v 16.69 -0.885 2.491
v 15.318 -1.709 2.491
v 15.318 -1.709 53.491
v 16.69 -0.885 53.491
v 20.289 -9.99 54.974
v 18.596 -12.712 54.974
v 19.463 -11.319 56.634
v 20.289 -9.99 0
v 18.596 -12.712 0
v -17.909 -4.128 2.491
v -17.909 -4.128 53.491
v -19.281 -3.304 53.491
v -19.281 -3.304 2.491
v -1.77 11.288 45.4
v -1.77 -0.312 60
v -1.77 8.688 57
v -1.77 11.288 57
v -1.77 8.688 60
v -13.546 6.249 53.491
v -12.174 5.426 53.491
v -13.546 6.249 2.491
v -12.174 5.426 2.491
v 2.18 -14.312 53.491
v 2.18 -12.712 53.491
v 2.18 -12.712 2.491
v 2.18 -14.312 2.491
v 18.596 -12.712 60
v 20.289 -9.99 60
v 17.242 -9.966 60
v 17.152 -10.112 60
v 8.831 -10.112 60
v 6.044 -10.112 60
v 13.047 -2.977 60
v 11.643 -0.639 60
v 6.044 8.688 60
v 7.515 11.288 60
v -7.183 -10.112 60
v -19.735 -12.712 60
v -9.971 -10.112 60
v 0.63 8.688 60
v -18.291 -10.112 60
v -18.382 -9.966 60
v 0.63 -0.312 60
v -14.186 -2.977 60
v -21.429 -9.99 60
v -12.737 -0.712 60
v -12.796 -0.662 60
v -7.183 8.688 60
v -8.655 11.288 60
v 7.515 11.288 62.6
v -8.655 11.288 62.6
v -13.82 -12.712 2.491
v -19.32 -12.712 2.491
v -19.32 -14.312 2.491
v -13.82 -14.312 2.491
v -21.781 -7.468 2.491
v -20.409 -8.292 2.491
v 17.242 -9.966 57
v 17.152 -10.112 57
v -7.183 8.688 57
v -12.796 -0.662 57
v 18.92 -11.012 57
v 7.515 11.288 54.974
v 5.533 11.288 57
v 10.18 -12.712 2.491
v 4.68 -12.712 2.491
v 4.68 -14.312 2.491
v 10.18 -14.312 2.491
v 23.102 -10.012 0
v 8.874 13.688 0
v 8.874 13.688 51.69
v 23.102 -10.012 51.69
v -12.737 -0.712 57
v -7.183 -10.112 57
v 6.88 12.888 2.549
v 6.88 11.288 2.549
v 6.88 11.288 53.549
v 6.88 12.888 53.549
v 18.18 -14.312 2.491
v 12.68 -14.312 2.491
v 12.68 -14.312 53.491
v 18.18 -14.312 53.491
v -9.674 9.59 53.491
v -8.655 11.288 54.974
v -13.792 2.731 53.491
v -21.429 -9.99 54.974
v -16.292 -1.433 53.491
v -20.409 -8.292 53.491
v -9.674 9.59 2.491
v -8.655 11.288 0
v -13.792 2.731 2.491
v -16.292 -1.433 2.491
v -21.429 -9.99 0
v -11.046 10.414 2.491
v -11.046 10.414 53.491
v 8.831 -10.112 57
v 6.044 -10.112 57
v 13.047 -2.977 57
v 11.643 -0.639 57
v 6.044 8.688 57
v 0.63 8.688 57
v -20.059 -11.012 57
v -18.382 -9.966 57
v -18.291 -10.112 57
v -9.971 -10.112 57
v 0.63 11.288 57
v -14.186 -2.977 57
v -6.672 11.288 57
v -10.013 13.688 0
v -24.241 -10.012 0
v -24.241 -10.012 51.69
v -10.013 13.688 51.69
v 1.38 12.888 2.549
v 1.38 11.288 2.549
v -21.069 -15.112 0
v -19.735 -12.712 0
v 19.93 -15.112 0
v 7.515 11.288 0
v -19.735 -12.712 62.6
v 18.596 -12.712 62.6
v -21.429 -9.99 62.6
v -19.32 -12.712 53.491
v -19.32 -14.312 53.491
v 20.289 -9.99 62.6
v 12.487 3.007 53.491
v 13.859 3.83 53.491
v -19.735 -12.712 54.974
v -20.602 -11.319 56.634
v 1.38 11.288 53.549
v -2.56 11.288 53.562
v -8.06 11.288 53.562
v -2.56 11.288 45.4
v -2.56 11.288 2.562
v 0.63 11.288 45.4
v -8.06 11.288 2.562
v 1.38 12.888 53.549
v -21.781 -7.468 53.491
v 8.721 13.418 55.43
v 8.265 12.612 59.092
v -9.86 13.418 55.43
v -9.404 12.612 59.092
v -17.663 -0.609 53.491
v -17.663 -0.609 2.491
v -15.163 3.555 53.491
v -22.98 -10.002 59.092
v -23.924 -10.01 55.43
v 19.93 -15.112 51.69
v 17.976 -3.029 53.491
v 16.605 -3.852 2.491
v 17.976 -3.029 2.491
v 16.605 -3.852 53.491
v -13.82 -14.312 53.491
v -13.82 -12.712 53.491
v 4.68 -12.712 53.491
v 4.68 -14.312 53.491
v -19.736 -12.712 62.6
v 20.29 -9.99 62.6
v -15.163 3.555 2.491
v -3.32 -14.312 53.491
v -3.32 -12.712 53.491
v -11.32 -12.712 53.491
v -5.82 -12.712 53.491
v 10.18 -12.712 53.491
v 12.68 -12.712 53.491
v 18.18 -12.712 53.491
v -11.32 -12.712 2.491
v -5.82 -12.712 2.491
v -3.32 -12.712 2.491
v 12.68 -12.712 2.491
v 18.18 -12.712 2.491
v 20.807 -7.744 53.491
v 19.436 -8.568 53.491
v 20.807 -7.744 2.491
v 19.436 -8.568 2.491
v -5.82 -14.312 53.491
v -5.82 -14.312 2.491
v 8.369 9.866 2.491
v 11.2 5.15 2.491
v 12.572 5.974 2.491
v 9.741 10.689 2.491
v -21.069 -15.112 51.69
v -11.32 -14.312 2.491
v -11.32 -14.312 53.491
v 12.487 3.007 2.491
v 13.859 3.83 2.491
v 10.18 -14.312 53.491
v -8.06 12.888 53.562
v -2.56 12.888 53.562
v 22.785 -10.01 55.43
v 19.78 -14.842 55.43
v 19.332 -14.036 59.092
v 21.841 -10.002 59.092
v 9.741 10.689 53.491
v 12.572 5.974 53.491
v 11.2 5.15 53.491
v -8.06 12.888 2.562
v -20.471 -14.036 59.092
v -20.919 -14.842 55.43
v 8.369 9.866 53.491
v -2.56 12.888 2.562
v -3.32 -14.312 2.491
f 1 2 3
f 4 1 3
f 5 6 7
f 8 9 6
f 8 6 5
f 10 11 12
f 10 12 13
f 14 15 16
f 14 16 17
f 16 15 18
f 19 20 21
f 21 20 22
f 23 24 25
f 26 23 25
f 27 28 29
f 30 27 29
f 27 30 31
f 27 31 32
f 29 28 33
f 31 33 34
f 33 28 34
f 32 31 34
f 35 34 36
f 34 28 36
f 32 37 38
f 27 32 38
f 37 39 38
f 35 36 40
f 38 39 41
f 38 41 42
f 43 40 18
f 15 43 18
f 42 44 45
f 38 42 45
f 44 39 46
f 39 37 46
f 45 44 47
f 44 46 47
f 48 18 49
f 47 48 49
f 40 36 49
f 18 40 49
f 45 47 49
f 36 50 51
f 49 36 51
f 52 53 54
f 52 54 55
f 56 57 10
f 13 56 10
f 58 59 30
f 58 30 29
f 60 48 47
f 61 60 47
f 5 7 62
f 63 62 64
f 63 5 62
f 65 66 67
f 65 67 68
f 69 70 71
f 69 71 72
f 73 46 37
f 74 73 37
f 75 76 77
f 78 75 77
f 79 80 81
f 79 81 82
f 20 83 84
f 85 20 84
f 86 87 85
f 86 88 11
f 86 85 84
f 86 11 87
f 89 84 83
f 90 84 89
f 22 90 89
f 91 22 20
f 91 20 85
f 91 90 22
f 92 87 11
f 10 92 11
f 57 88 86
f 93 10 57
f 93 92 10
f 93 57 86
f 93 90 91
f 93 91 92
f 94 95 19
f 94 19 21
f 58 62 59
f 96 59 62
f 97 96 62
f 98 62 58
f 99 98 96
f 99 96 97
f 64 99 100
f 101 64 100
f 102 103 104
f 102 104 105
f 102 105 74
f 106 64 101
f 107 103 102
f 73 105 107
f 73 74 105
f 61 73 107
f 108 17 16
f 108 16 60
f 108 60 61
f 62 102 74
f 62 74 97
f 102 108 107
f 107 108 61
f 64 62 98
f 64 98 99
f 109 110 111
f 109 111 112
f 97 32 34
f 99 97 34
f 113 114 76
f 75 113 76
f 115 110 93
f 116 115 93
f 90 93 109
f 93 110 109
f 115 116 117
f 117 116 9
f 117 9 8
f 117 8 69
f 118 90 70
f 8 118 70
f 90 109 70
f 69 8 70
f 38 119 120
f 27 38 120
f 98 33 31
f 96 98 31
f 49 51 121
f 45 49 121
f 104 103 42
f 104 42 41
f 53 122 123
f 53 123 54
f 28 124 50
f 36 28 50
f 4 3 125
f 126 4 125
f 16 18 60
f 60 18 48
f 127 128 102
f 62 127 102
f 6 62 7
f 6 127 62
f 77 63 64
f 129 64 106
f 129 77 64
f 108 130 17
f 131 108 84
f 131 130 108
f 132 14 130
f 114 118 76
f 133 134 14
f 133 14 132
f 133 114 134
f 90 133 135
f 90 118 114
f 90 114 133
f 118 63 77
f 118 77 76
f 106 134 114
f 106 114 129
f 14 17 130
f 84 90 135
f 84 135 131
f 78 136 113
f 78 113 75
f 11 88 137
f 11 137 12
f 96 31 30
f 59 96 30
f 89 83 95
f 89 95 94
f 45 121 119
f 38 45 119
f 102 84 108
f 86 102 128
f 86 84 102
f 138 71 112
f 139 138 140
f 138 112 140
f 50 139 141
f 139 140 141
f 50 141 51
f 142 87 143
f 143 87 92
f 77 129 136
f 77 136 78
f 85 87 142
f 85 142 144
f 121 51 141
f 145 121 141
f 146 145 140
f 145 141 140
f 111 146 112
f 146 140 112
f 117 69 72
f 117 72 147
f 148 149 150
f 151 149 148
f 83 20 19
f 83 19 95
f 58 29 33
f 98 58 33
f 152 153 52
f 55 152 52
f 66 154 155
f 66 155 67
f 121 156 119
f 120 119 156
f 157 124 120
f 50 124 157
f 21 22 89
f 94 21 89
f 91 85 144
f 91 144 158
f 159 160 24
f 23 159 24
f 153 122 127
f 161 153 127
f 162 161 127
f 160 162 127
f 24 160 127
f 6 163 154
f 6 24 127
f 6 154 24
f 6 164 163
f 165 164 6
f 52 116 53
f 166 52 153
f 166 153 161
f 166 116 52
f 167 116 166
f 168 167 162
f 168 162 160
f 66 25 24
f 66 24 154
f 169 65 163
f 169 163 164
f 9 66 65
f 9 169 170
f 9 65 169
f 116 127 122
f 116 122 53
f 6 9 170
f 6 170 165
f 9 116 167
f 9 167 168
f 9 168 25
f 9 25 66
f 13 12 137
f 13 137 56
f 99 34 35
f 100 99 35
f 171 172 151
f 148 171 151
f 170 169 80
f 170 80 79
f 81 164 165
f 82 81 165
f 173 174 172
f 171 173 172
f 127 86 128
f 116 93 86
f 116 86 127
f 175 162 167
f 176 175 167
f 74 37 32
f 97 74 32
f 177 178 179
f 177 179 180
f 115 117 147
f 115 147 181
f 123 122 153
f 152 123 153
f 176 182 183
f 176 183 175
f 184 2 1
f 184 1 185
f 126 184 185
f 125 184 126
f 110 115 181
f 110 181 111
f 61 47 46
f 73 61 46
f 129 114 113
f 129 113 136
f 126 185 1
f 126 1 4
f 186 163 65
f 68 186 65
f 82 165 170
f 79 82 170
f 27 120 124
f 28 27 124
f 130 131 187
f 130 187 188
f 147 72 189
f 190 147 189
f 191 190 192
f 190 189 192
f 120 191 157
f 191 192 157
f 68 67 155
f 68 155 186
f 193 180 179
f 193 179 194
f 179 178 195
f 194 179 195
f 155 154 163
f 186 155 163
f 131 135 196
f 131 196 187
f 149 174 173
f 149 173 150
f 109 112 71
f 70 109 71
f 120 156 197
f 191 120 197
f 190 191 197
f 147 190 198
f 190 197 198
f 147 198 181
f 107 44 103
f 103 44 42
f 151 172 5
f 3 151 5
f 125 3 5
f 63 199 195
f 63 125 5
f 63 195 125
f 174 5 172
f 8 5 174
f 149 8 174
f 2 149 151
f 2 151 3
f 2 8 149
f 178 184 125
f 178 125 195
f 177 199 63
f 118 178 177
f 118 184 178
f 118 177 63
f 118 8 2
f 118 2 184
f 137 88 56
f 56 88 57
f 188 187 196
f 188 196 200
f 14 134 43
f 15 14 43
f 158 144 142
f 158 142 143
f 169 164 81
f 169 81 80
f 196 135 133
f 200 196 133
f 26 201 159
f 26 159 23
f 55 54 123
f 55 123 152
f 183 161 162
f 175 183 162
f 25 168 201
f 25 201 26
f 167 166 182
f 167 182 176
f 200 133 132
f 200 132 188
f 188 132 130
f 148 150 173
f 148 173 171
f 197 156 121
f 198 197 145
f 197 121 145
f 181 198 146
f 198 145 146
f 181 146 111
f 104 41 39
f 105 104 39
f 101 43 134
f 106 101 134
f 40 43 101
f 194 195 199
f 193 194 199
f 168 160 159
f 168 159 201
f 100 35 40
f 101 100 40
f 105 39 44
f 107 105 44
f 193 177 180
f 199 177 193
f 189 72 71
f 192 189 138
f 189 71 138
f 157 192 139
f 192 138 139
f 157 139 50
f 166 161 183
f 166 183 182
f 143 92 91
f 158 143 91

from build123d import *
from OCP.BRepFilletAPI import BRepFilletAPI_MakeChamfer

# Parameters (mm, degrees)
BOSS_EXTRUDE1_DEPTH  = 62.6
BOSS_EXTRUDE2_DEPTH  = 5.6
CUT_EXTRUDE1_DEPTH   = 2.6
CHAMFER1_SIZE        = 5
CHAMFER1_SIZE_2      = 2.6
SKETCH7_W            = 2.4
SKETCH7_H            = 11.6
BOSS_EXTRUDE3_DEPTH  = 14.6
CUT_EXTRUDE2_DEPTH   = 5.6
BOSS_EXTRUDE11_DEPTH = 3
CUT_EXTRUDE3_DEPTH   = 81
FILLET1_R            = 26
SKETCH11_W           = 5.5
SKETCH11_H           = 51
CUT_EXTRUDE4_DEPTH   = 1.6
LPATTERN1_COUNT      = 3
LPATTERN1_PITCH      = 8
LPATTERN1_COL_COUNT  = 3
LPATTERN1_COL_PITCH  = 8
SKETCH12_W           = 51
SKETCH12_H           = 4.856806487
CUT_EXTRUDE5_DEPTH   = 1.6
LPATTERN2_COUNT      = 2
LPATTERN2_PITCH      = 8
LPATTERN2_COL_COUNT  = 2
LPATTERN2_COL_PITCH  = 8
SKETCH13_W           = 51
SKETCH13_H           = 5.5
CUT_EXTRUDE6_DEPTH   = 1.6
LPATTERN3_COUNT      = 2
LPATTERN3_PITCH      = 8
LPATTERN3_COL_COUNT  = 2
LPATTERN3_COL_PITCH  = 8
SKETCH14_W           = 5.5
SKETCH14_H           = 51
CUT_EXTRUDE7_DEPTH   = 1.6
CHAMFER2_SIZE        = 1.7
CHAMFER2_SIZE2       = 2.025981107
CHAMFER3_SIZE        = 1.7
CHAMFER3_SIZE2       = 2.025981107
CHAMFER4_SIZE        = 1.7
CHAMFER4_SIZE2       = 2.025981107


# Some blends are built 0.0001 mm under size
with BuildPart() as part:
    # Sketch1 → Boss-Extrude1 (new body)
    with BuildSketch(Plane.XY):
        Polygon((-24.475616366, -10.013909772), (-21.180169245, -15.311974759), (20.041009631, -15.311974759), (23.336456752, -10.013909772), (8.987096109, 13.888025241), (-10.126255723, 13.888025241), align=None)
        Polygon((-21.428634645, -9.989877279), (-19.735463964, -12.711974759), (18.59630435, -12.711974759), (20.289475031, -9.989877279), (7.515434067, 11.288025241), (-8.654593681, 11.288025241), align=None, mode=Mode.SUBTRACT)
    extrude(amount=BOSS_EXTRUDE1_DEPTH)

    # Sketch2 → Boss-Extrude2 (add)
    with BuildSketch(Plane.XY.offset(62.6)):
        Polygon((-8.654593681, 11.288025241), (-21.428634645, -9.989877279), (-19.735463964, -12.711974759), (18.59630435, -12.711974759), (20.289475031, -9.989877279), (7.515434067, 11.288025241), align=None)
        Polygon((-7.182931639, 8.688025241), (-18.381652924, -9.965844785), (-18.290758683, -10.111974759), (17.151599069, -10.111974759), (17.24249331, -9.965844785), (6.043772025, 8.688025241), align=None, mode=Mode.SUBTRACT)
    extrude(amount=-BOSS_EXTRUDE2_DEPTH)

    # Sketch4 → Cut-Extrude1 (cut)
    with BuildSketch(Plane.XY.offset(62.6)):
        Polygon((7.515434067, 11.288025241), (-8.654593681, 11.288025241), (-21.428634645, -9.989877279), (-19.735463964, -12.711974759), (18.59630435, -12.711974759), (20.289475031, -9.989877279), align=None)
        Polygon((6.043772025, 8.688025241), (-7.182931639, 8.688025241), (-18.381652924, -9.965844785), (-18.290758683, -10.111974759), (17.151599069, -10.111974759), (17.24249331, -9.965844785), align=None, mode=Mode.SUBTRACT)
    extrude(amount=-CUT_EXTRUDE1_DEPTH, mode=Mode.SUBTRACT)

    # Chamfer1
    chamfer1_edges_1 = [part.edges().sort_by_distance(p)[0] for p in [
        (-0.569579807, -15.311974759, 62.6),
    ]]
    chamfer1_side_1 = [part.faces().sort_by_distance(p)[0] for p in [
        (-0.569579807, -15.311974759, 62.548),
    ]]
    chamfer1_edges_2 = [part.edges().sort_by_distance(p)[0] for p in [
        (21.688733191, -12.662942265, 62.6),
    ]]
    chamfer1_side_2 = [part.faces().sort_by_distance(p)[0] for p in [
        (21.644578037, -12.635477337, 62.6),
    ]]
    chamfer1_edges_3 = [part.edges().sort_by_distance(p)[0] for p in [
        (16.16177643, 1.937057735, 62.6),
    ]]
    chamfer1_side_3 = [part.faces().sort_by_distance(p)[0] for p in [
        (16.117193547, 1.91029271, 62.6),
    ]]
    chamfer1_edges_4 = [part.edges().sort_by_distance(p)[0] for p in [
        (-0.569579807, 13.888025241, 62.6),
    ]]
    chamfer1_side_4 = [part.faces().sort_by_distance(p)[0] for p in [
        (-0.569579807, 13.836025241, 62.6),
    ]]
    chamfer1_edges_5 = [part.edges().sort_by_distance(p)[0] for p in [
        (-17.300936044, 1.937057735, 62.6),
    ]]
    chamfer1_side_5 = [part.faces().sort_by_distance(p)[0] for p in [
        (-17.300936044, 1.937057735, 62.548),
    ]]
    chamfer1_edges_6 = [part.edges().sort_by_distance(p)[0] for p in [
        (-22.827892805, -12.662942265, 62.6),
    ]]
    chamfer1_side_6 = [part.faces().sort_by_distance(p)[0] for p in [
        (-22.827892805, -12.662942265, 62.548),
    ]]
    chamfer1 = BRepFilletAPI_MakeChamfer(part.part.solid().wrapped)
    for e in chamfer1_edges_1:
        chamfer1.Add(CHAMFER1_SIZE - 0.0001, CHAMFER1_SIZE_2 - 0.0001, e.wrapped, chamfer1_side_1[0].wrapped)
    for e in chamfer1_edges_2:
        chamfer1.Add(CHAMFER1_SIZE_2 - 0.0001, CHAMFER1_SIZE - 0.0001, e.wrapped, chamfer1_side_2[0].wrapped)
    for e in chamfer1_edges_3:
        chamfer1.Add(CHAMFER1_SIZE_2 - 0.0001, CHAMFER1_SIZE - 0.0001, e.wrapped, chamfer1_side_3[0].wrapped)
    for e in chamfer1_edges_4:
        chamfer1.Add(CHAMFER1_SIZE_2 - 0.0001, CHAMFER1_SIZE - 0.0001, e.wrapped, chamfer1_side_4[0].wrapped)
    for e in chamfer1_edges_5:
        chamfer1.Add(CHAMFER1_SIZE - 0.0001, CHAMFER1_SIZE_2 - 0.0001, e.wrapped, chamfer1_side_5[0].wrapped)
    for e in chamfer1_edges_6:
        chamfer1.Add(CHAMFER1_SIZE - 0.0001, CHAMFER1_SIZE_2 - 0.0001, e.wrapped, chamfer1_side_6[0].wrapped)
    add(Compound.cast(chamfer1.Shape()), mode=Mode.REPLACE)  # a hair under: the kernel refuses the full size

    # Sketch7 → Boss-Extrude3 (add)
    with BuildSketch(Plane.XY.offset(60)):
        with Locations((-0.569579807, 5.488025241)):
            Rectangle(SKETCH7_W, SKETCH7_H)
    extrude(amount=-BOSS_EXTRUDE3_DEPTH)

    # Sketch8 → Cut-Extrude2 (cut)
    with BuildSketch(Plane(origin=(0.630420193, 0, 0), x_dir=(0, 0, -1), z_dir=(1, 0, 0))):
        Polygon((-45.4, -0.311974759), (-45.4, 11.288025241), (-60, -0.311974759), align=None)
    extrude(amount=-CUT_EXTRUDE2_DEPTH, mode=Mode.SUBTRACT)

    # Sketch9 → Boss-Extrude11 (add)
    with BuildSketch(Plane.XY.offset(60)):
        Polygon((13.046908424, -2.977199103), (8.831384276, -10.111974759), (9.211067566, -10.75458882), (5.807424218, -10.75458882), (6.043772025, -10.111974759), (11.643132668, -0.638909772), (11.902294033, -0.497125706), (13.714637927, -2.3094696), align=None)
        Polygon((-14.186068038, -2.977199103), (-14.822440578, -2.585111628), (-13.347627203, -0.191434724), (-12.736845161, -0.711974759), (-7.182931639, -10.111974759), (-6.628519955, -10.75458882), (-9.97054389, -10.75458882), (-9.97054389, -10.111974759), align=None)
    extrude(amount=-BOSS_EXTRUDE11_DEPTH)

    # Sketch10 → Cut-Extrude3 (cut)
    with BuildSketch(Plane(origin=(0, 0, 0), x_dir=(-1, 0, 0), z_dir=(0, 0, -1))):
        Polygon((24.475616366, -10.013909772), (10.126255723, 13.888025241), (-8.987096109, 13.888025241), (-23.336456752, -10.013909772), (-20.041009631, -15.311974759), (21.180169245, -15.311974759), align=None)
        Polygon((24.241233156, -10.012061119), (10.013050951, 13.688025241), (-8.873891337, 13.688025241), (-23.102073542, -10.012061119), (-19.929878455, -15.111974759), (21.069038069, -15.111974759), align=None, mode=Mode.SUBTRACT)
    extrude(amount=-CUT_EXTRUDE3_DEPTH, mode=Mode.SUBTRACT)

    # Fillet1
    # the kernel refuses this fillet: 26 mm, written as the material it takes off along each edge
    with BuildSketch(Plane(origin=(31.414243832, 3.351351117, 57.984722485), x_dir=(-0.39174625811116504, 0.24366992131316473, 0.8872202875854094), z_dir=(-0.5281717070926119, -0.8491375906335064, 0))) as fillet1_piece_1:
        with BuildLine():
            CenterArc((6.409899399, 25.971924525), FILLET1_R, 242.52600135, 24.811106356)
            Line((-5.585097434, 2.904197048), (-5.824997371, 2.442842498))
            Line((-5.824997371, 2.442842498), (-0.239899937, -0.46135455))
            Line((-0.239899937, -0.46135455), (0, -0.52))
            ThreePointArc((0, -0.52), (2.600976093, -0.52), (5.177793242, -0.51943849))
            Line((5.177793242, -0.51943849), (5.201952186, 0))
        make_face()
    extrude(amount=37.481249755, mode=Mode.SUBTRACT)
    with BuildSketch(Plane(origin=(-36.806666909, -15.111974759, 57.984722485), x_dir=(0, 0.46134603205930286, 0.8872202875854095), z_dir=(1, 0, 0))) as fillet1_piece_2:
        with BuildLine():
            CenterArc((6.409899399, -25.971924525), FILLET1_R, 92.662892294, 24.811106356)
            Line((-5.585097434, -2.904197048), (-5.824997371, -2.442842498))
            Line((-5.824997371, -2.442842498), (-0.239899937, 0.46135455))
            Line((-0.239899937, 0.46135455), (0, 0.52))
            ThreePointArc((0, 0.52), (2.600976093, 0.52), (5.177793242, 0.51943849))
            Line((5.177793242, 0.51943849), (5.201952186, 0))
        make_face()
    extrude(amount=72.474174205, mode=Mode.SUBTRACT)
    with BuildSketch(Plane(origin=(-32.553403446, 3.351351117, 57.984722485), x_dir=(0.39174625811116337, 0.24366992131316362, 0.8872202875854104), z_dir=(0.5281717070926113, -0.8491375906335067, 0))) as fillet1_piece_3:
        with BuildLine():
            CenterArc((6.409899399, -25.971924525), FILLET1_R, 92.662892294, 24.811106356)
            Line((-5.585097434, -2.904197048), (-5.824997371, -2.442842498))
            Line((-5.824997371, -2.442842498), (-0.239899937, 0.46135455))
            Line((-0.239899937, 0.46135455), (0, 0.52))
            ThreePointArc((0, 0.52), (2.600976093, 0.52), (5.177793242, 0.51943849))
            Line((5.177793242, 0.51943849), (5.201952186, 0))
        make_face()
    extrude(amount=37.481249755, mode=Mode.SUBTRACT)
    with BuildSketch(Plane(origin=(-1.912704463, 27.180888106, 57.984722485), x_dir=(0.39554108226314943, -0.2374603409813078, 0.8872202875854099), z_dir=(-0.5147120046125904, -0.8573631391118287, 0))) as fillet1_piece_4:
        with BuildLine():
            CenterArc((6.409899399, -25.971924525), FILLET1_R, 92.662892294, 24.811106356)
            Line((-5.585097434, -2.904197048), (-5.824997371, -2.442842498))
            Line((-5.824997371, -2.442842498), (-0.239899937, 0.46135455))
            Line((-0.239899937, 0.46135455), (0, 0.52))
            ThreePointArc((0, 0.52), (2.600976093, 0.52), (5.177793242, 0.51943849))
            Line((5.177793242, 0.51943849), (5.201952186, 0))
        make_face()
    extrude(amount=59.118254304, mode=Mode.SUBTRACT)
    with BuildSketch(Plane(origin=(-25.750679791, 13.688025241, 57.984722485), x_dir=(0, -0.4613460320593018, 0.88722028758541), z_dir=(1, 0, 0))) as fillet1_piece_5:
        with BuildLine():
            CenterArc((6.409899399, 25.971924525), FILLET1_R, 242.52600135, 24.811106356)
            Line((-5.585097434, 2.904197048), (-5.824997371, 2.442842498))
            Line((-5.824997371, 2.442842498), (-0.239899937, -0.46135455))
            Line((-0.239899937, -0.46135455), (0, -0.52))
            ThreePointArc((0, -0.52), (2.600976093, -0.52), (5.177793242, -0.51943849))
            Line((5.177793242, -0.51943849), (5.201952186, 0))
        make_face()
    extrude(amount=50.362199967, mode=Mode.SUBTRACT)
    with BuildSketch(Plane(origin=(0.773544849, 27.180888106, 57.984722485), x_dir=(-0.3955410822631513, -0.23746034098130891, 0.8872202875854089), z_dir=(0.5147120046125901, -0.8573631391118287, 0))) as fillet1_piece_6:
        with BuildLine():
            CenterArc((6.409899399, 25.971924525), FILLET1_R, 242.52600135, 24.811106356)
            Line((-5.585097434, 2.904197048), (-5.824997371, 2.442842498))
            Line((-5.824997371, 2.442842498), (-0.239899937, -0.46135455))
            Line((-0.239899937, -0.46135455), (0, -0.52))
            ThreePointArc((0, -0.52), (2.600976093, -0.52), (5.177793242, -0.51943849))
            Line((5.177793242, -0.51943849), (5.201952186, 0))
        make_face()
    extrude(amount=59.118254304, mode=Mode.SUBTRACT)

    # Sketch11 → Cut-Extrude4 (cut)
    with BuildSketch(Plane(origin=(0, -12.711974759, 0), x_dir=(1, 0, 0), z_dir=(0, 1, 0))):
        with Locations((-0.569579807, -27.99093939)):
            Rectangle(SKETCH11_W, SKETCH11_H)
    cut_extrude4 = extrude(amount=-CUT_EXTRUDE4_DEPTH, mode=Mode.SUBTRACT)

    # LPattern1: Cut-Extrude4 ×3
    with Locations(*[(i * LPATTERN1_PITCH, 0, 0) for i in range(1, LPATTERN1_COUNT)]):
        add(cut_extrude4, mode=Mode.SUBTRACT)

    # LPattern1 col: Cut-Extrude4 ×3
    with Locations(*[(-i * LPATTERN1_COL_PITCH, 0, 0) for i in range(1, LPATTERN1_COL_COUNT)]):
        add(cut_extrude4, mode=Mode.SUBTRACT)

    # Sketch12 → Cut-Extrude5 (cut)
    with BuildSketch(Plane(origin=(-11.34309584, 6.809748789, 0), x_dir=(0, 0, -1), z_dir=(0.8573631391118286, -0.5147120046125905, 0))):
        with Locations((-27.99093939, -7.185607273)):
            Rectangle(SKETCH12_W, SKETCH12_H)
    cut_extrude5 = extrude(amount=-CUT_EXTRUDE5_DEPTH, mode=Mode.SUBTRACT)

    # LPattern2: Cut-Extrude5 ×2
    with Locations(*[Vector(-0.5147120046125904, -0.8573631391118286, 0) * (i * LPATTERN2_PITCH) for i in range(1, LPATTERN2_COUNT)]):
        add(cut_extrude5, mode=Mode.SUBTRACT)

    # LPattern2 col: Cut-Extrude5 ×2
    with Locations(*[Vector(0.5147120046125906, 0.8573631391118286, 0) * (i * LPATTERN2_COL_PITCH) for i in range(1, LPATTERN2_COL_COUNT)]):
        add(cut_extrude5, mode=Mode.SUBTRACT)

    # Sketch13 → Cut-Extrude6 (cut)
    with BuildSketch(Plane(origin=(10.505732014, 6.307043233, 0), x_dir=(0, 0, 1), z_dir=(-0.8573631391118287, -0.5147120046125901, 0))):
        with Locations((27.99093939, -6.599268144)):
            Rectangle(SKETCH13_W, SKETCH13_H)
    cut_extrude6 = extrude(amount=-CUT_EXTRUDE6_DEPTH, mode=Mode.SUBTRACT)

    # LPattern3: Cut-Extrude6 ×2
    with Locations(*[Vector(0.5147120046125901, -0.8573631391118288, 0) * (i * LPATTERN3_PITCH) for i in range(1, LPATTERN3_COUNT)]):
        add(cut_extrude6, mode=Mode.SUBTRACT)

    # LPattern3 col: Cut-Extrude6 ×2
    with Locations(*[Vector(-0.5147120046125901, 0.8573631391118288, 0) * (i * LPATTERN3_COL_PITCH) for i in range(1, LPATTERN3_COL_COUNT)]):
        add(cut_extrude6, mode=Mode.SUBTRACT)

    # Sketch14 → Cut-Extrude7 (cut)
    with BuildSketch(Plane.XZ.offset(-11.288025241)):
        with Locations((4.130420193, 28.049435943)):
            Rectangle(SKETCH14_W, SKETCH14_H)
        with Locations((-5.310377128, 28.061535376)):
            Rectangle(SKETCH14_W, SKETCH14_H)
    extrude(amount=-CUT_EXTRUDE7_DEPTH, mode=Mode.SUBTRACT)

    # Chamfer2
    chamfer2_edges = [part.edges().sort_by_distance(p)[0] for p in [
        (-0.569579807, -12.711974759, 57),
    ]]
    chamfer2_side = [part.faces().sort_by_distance(p)[0] for p in [
        (-2.250869811, 9.988025241, 57),
    ]]
    chamfer(chamfer2_edges, length=CHAMFER2_SIZE, length2=CHAMFER2_SIZE2, reference=chamfer2_side[0])

    # Chamfer3
    chamfer3_edges = [part.edges().sort_by_distance(p)[0] for p in [
        (-15.041614163, 0.649073981, 57),
    ]]
    chamfer3_side = [part.faces().sort_by_distance(p)[0] for p in [
        (-20.709079395, -10.251078432, 57),
    ]]
    chamfer(chamfer3_edges, length=CHAMFER3_SIZE, length2=CHAMFER3_SIZE2, reference=chamfer3_side[0])

    # Chamfer4
    chamfer4_edges = [part.edges().sort_by_distance(p)[0] for p in [
        (13.902454549, 0.649073981, 57),
    ]]
    chamfer4_side = [part.faces().sort_by_distance(p)[0] for p in [
        (-0.202849696, -10.550962467, 57),
    ]]
    chamfer(chamfer4_edges, length=CHAMFER4_SIZE, length2=CHAMFER4_SIZE2, reference=chamfer4_side[0])


solid = part.part
